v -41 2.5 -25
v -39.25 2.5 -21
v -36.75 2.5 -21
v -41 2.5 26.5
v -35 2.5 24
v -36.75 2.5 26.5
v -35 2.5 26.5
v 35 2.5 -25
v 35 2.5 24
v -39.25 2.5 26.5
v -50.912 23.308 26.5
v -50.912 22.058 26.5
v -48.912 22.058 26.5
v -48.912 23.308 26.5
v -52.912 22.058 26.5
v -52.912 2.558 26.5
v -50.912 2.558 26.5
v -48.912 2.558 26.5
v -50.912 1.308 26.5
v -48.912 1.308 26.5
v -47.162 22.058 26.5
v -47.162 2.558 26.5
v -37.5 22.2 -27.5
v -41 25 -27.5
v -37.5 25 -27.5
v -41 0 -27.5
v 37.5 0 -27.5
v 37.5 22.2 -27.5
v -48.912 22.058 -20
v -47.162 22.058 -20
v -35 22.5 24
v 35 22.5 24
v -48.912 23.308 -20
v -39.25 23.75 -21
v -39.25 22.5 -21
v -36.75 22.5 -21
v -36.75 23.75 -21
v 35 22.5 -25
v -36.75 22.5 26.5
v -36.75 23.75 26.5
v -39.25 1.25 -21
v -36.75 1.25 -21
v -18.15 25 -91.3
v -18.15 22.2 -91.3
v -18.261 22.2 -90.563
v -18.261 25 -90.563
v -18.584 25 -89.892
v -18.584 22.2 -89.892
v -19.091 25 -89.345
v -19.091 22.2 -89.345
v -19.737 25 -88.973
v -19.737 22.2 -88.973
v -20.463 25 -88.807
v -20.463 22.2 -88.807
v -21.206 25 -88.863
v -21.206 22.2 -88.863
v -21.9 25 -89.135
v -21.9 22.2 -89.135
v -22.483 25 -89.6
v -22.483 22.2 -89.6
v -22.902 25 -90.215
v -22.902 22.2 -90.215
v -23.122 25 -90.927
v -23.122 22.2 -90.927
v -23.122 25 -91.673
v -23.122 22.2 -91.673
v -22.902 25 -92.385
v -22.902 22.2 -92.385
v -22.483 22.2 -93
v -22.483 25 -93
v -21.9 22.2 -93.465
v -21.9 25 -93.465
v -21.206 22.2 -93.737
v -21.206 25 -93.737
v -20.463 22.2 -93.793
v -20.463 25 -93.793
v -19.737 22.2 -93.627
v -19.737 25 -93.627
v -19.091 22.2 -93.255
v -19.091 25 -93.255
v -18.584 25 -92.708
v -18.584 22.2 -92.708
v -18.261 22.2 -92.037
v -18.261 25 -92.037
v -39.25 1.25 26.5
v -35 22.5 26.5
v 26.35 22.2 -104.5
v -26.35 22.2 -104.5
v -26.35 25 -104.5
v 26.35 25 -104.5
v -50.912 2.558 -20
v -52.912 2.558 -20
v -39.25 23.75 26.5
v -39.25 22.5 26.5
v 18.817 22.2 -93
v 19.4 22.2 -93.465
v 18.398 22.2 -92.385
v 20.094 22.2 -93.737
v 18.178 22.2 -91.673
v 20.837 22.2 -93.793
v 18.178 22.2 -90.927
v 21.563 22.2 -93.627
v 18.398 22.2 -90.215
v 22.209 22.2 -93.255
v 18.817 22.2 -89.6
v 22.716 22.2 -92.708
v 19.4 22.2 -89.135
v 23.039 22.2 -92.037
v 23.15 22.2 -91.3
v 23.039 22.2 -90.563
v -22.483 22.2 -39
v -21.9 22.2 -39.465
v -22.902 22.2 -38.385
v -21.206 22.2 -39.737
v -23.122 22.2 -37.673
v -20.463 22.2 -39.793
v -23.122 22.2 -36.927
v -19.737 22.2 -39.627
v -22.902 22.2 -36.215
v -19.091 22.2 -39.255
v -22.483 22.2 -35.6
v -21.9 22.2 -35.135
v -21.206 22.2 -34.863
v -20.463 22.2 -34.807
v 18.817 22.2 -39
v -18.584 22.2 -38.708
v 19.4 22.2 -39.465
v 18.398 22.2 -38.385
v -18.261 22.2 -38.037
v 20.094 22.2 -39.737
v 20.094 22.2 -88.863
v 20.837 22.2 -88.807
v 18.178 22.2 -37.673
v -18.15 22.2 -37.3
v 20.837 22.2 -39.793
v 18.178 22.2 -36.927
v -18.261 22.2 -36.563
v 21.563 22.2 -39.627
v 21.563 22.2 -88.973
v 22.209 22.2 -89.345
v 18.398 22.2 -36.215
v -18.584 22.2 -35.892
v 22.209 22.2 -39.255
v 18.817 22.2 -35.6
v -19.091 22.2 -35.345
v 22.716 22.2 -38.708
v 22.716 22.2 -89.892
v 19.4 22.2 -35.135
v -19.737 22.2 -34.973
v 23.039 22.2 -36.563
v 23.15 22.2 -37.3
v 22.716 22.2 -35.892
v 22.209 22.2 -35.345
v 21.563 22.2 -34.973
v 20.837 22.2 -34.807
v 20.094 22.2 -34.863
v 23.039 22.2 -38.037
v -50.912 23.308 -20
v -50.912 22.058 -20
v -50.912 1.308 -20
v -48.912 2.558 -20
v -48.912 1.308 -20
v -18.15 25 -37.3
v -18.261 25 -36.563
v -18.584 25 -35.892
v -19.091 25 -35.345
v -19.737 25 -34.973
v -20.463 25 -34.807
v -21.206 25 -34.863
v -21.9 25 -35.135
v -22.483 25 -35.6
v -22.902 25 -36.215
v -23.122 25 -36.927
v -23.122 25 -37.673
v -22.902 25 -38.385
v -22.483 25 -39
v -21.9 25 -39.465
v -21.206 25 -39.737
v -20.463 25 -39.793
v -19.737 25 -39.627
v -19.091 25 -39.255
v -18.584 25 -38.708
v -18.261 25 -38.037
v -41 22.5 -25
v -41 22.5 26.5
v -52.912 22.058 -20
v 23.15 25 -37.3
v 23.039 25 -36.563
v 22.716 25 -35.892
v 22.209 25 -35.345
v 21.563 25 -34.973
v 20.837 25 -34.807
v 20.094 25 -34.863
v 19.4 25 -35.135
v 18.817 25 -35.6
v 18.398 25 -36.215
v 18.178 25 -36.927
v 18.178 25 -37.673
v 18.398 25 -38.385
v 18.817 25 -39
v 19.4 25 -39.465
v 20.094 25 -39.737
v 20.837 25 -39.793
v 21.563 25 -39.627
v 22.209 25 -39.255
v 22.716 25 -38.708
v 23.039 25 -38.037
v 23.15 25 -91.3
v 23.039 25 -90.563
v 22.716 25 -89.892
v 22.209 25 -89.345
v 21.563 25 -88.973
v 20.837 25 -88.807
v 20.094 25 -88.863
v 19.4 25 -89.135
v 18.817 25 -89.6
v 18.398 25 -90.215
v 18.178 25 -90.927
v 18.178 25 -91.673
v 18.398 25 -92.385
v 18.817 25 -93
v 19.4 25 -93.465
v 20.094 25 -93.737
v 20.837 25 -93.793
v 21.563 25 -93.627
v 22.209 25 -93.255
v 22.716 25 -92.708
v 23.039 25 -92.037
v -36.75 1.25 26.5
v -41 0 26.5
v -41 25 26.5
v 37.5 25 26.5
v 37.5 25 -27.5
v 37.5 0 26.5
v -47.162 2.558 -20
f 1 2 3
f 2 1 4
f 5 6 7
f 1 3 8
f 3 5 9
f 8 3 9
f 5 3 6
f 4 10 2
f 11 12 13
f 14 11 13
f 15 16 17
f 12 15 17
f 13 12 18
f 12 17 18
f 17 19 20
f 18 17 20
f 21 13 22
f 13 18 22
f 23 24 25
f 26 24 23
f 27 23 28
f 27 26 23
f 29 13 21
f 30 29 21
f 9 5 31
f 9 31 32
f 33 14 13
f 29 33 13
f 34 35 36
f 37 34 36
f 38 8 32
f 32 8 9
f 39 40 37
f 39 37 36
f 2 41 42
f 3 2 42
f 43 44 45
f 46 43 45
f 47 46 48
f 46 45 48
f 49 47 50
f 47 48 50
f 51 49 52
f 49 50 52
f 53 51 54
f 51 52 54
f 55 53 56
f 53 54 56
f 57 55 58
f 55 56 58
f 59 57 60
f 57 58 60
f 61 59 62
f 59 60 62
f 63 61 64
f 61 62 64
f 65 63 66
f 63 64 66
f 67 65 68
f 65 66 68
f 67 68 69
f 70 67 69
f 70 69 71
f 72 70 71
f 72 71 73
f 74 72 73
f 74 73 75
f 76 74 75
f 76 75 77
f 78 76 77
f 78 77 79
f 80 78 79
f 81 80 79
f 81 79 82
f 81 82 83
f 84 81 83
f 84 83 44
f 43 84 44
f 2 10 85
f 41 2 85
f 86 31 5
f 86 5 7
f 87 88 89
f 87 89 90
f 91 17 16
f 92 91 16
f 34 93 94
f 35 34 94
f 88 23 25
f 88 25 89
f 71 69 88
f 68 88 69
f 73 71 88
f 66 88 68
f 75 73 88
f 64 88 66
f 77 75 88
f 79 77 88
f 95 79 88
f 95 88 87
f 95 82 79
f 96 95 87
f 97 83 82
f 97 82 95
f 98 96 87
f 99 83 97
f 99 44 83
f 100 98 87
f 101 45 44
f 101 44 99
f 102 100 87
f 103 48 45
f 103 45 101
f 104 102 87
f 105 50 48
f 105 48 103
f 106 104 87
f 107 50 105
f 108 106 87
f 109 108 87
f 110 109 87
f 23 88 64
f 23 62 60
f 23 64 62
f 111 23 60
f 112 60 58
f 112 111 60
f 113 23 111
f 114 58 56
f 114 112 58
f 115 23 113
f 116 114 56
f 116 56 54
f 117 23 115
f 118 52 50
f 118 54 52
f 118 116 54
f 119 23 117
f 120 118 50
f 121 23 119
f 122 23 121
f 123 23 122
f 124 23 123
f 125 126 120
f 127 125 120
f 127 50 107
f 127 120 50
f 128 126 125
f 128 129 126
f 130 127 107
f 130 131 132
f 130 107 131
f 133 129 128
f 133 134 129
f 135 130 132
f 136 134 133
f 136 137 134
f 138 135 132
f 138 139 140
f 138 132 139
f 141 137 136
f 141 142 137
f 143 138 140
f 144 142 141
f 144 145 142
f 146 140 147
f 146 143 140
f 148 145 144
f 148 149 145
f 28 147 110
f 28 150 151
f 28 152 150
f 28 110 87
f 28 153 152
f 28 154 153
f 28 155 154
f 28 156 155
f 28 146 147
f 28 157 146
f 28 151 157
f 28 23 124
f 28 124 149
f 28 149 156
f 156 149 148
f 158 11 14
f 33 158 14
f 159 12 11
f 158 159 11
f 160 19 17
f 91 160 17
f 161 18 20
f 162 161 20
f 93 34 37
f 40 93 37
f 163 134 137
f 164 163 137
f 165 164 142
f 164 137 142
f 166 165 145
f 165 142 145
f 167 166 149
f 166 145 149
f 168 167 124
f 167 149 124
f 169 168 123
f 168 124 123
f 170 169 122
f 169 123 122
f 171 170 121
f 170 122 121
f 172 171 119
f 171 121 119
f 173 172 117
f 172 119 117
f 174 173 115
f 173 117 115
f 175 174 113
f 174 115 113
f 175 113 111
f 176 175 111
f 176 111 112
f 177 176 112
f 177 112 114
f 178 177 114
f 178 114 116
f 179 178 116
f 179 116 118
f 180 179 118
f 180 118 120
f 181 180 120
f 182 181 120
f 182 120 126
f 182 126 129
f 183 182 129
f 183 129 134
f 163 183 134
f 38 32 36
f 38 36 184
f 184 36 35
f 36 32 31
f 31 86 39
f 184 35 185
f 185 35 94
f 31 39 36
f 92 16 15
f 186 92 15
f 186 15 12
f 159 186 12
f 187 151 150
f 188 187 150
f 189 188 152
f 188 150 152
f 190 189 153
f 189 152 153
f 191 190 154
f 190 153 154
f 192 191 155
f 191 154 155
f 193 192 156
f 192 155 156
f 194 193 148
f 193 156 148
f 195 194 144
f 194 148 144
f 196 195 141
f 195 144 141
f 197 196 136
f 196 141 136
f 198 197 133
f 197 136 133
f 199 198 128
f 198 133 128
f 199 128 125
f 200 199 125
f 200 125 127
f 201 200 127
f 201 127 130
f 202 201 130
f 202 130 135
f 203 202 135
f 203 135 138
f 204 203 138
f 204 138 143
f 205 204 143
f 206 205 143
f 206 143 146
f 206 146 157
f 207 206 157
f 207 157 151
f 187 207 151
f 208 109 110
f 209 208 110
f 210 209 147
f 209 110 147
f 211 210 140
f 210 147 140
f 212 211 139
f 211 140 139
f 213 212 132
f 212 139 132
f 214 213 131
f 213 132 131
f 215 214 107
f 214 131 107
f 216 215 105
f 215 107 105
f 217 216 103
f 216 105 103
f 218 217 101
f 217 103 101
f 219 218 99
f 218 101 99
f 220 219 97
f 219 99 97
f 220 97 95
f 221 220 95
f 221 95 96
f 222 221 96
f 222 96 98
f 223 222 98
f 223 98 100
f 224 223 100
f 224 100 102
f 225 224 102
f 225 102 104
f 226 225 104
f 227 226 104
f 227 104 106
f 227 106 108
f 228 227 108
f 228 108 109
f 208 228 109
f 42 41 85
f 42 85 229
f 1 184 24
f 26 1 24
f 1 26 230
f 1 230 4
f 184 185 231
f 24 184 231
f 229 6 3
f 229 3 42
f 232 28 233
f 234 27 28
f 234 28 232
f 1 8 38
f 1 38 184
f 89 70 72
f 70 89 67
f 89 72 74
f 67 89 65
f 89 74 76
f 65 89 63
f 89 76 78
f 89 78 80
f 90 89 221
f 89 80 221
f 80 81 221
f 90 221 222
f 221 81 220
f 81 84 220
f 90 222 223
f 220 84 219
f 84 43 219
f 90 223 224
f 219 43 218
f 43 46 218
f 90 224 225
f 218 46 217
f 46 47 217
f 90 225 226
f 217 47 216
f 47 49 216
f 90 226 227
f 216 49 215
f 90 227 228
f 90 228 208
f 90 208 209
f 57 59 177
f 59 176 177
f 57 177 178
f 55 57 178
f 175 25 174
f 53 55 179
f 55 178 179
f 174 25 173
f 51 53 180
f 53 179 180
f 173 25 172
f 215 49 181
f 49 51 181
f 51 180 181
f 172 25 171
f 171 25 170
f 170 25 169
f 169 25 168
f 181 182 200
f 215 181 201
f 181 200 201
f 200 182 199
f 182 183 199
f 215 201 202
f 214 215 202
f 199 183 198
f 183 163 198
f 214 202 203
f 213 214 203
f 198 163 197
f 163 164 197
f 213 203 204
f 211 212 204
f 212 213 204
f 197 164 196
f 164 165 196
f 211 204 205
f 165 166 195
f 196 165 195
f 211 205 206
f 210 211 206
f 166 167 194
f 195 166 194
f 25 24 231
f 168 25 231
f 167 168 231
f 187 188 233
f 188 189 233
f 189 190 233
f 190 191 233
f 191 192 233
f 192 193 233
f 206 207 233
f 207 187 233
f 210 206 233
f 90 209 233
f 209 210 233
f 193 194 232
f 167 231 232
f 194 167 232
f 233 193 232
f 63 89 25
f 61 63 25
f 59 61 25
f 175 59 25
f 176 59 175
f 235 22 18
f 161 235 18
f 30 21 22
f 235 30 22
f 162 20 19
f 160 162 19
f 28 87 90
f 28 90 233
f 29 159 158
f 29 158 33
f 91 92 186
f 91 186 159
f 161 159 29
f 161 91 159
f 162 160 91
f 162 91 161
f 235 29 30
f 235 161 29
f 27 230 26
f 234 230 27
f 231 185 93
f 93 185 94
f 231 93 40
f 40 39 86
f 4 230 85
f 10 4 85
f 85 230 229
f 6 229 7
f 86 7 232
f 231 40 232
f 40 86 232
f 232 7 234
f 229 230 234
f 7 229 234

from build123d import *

# Parameters (mm, degrees)
F0_W      = 70
F0_H      = 49
F0_W_2    = 26.35
F0_H_2    = 0.8
F0_R      = 2.5
F0_W_3    = 3.5
F0_H_3    = 2.5
F0_W_4    = 2.5
F1_DEPTH  = 25
F2_DEPTH  = 22.5
F3_DEPTH  = 2.5
F6_W      = 2.5
F6_H      = 1.25
F7_DEPTH  = 51.5
F8_DEPTH  = 47.5
F9_DEPTH  = 46.5
F10_DEPTH = 22.2


# Not quite as in the source:
# - a feature names something its author has since deleted; it is built from what else it names


with BuildPart() as f1:
    # F0 (on Front) → F1 (new body)
    with BuildSketch(Plane.XZ):
        Polygon((-35, 24), (35, 24), (35, -25), (-35, -25), (-35, -27.5), (-26.35, -27.5), (0, -27.5), (26.35, -27.5), (37.5, -27.5), (37.5, 26.5), (-35, 26.5), align=None)
        with Locations((0, -0.5)):
            Rectangle(F0_W, F0_H)
        Polygon((26.35, -104.5), (37.5, -27.5), (26.35, -27.5), (26.35, -28.3), align=None)
        with Locations((-13.175, -27.9)):
            Rectangle(F0_W_2, F0_H_2)
        with Locations((13.175, -27.9)):
            Rectangle(F0_W_2, F0_H_2)
        Polygon((0, -28.3), (-26.35, -28.3), (-26.35, -104.5), (26.35, -104.5), (26.35, -28.3), align=None)
        with Locations((-20.65, -91.3)):
            Circle(F0_R, mode=Mode.SUBTRACT)
        with Locations((20.65, -91.3)):
            Circle(F0_R, mode=Mode.SUBTRACT)
        with Locations((-20.65, -37.3)):
            Circle(F0_R, mode=Mode.SUBTRACT)
        with Locations((20.65, -37.3)):
            Circle(F0_R, mode=Mode.SUBTRACT)
        Polygon((-26.35, -27.5), (-35, -27.5), (-37.5, -27.5), (-26.35, -104.5), (-26.35, -28.3), align=None)
        with Locations((-39.25, -26.25)):
            Rectangle(F0_W_3, F0_H_3)
        with Locations((-36.25, -26.25)):
            Rectangle(F0_W_4, F0_H_3)
    extrude(amount=-F1_DEPTH)

    # F0 (on Front) → F2 (cut)
    with BuildSketch(Plane.XZ):
        with Locations((0, -0.5)):
            Rectangle(F0_W, F0_H)
    extrude(amount=-F2_DEPTH, mode=Mode.SUBTRACT)

    # F0 (on Front) → F3 (join)
    with BuildSketch(Plane.XZ):
        with Locations((0, -0.5)):
            Rectangle(F0_W, F0_H)
    extrude(amount=-F3_DEPTH)

    # F6 (on 3pt) → F7 (join)
    with BuildSketch(Plane(origin=(0, 0, 26.5), x_dir=(1, 0, 0), z_dir=(0, 0, -1))):
        Polygon((-35, -25), (-35, -22.5), (-36.75, -22.5), (-36.75, -23.75), (-39.25, -23.75), (-39.25, -22.5), (-41, -22.5), (-41, -25), align=None)
        Polygon((-35, -2.5), (-35, 0), (-41, 0), (-41, -2.5), (-39.25, -2.5), (-39.25, -1.25), (-36.75, -1.25), (-36.75, -2.5), align=None)
        with Locations((-38, -1.875)):
            Rectangle(F6_W, F6_H)
        with Locations((-38, -23.125)):
            Rectangle(F6_W, F6_H)
    extrude(amount=F7_DEPTH)

    # F6 (on 3pt) → F8 (cut)
    with BuildSketch(Plane(origin=(0, 0, 26.5), x_dir=(1, 0, 0), z_dir=(0, 0, -1))):
        with Locations((-38, -23.125)):
            Rectangle(F6_W, F6_H)
        with Locations((-38, -1.875)):
            Rectangle(F6_W, F6_H)
    extrude(amount=F8_DEPTH, mode=Mode.SUBTRACT)

    # F0 (on Front) → F10 (cut)
    with BuildSketch(Plane.XZ):
        Polygon((-26.35, -27.5), (-35, -27.5), (-37.5, -27.5), (-26.35, -104.5), (-26.35, -28.3), align=None)
        Polygon((0, -28.3), (-26.35, -28.3), (-26.35, -104.5), (26.35, -104.5), (26.35, -28.3), align=None)
        with Locations((-20.65, -91.3)):
            Circle(F0_R, mode=Mode.SUBTRACT)
        with Locations((20.65, -91.3)):
            Circle(F0_R, mode=Mode.SUBTRACT)
        with Locations((-20.65, -37.3)):
            Circle(F0_R, mode=Mode.SUBTRACT)
        with Locations((20.65, -37.3)):
            Circle(F0_R, mode=Mode.SUBTRACT)
        Polygon((26.35, -104.5), (37.5, -27.5), (26.35, -27.5), (26.35, -28.3), align=None)
        with Locations((-13.175, -27.9)):
            Rectangle(F0_W_2, F0_H_2)
        with Locations((13.175, -27.9)):
            Rectangle(F0_W_2, F0_H_2)
    extrude(amount=-F10_DEPTH, mode=Mode.SUBTRACT)


with BuildPart() as f9:
    # F6 (on 3pt) → F9 (new body)
    with BuildSketch(Plane(origin=(0, 0, 26.5), x_dir=(1, 0, 0), z_dir=(0, 0, -1))):
        Polygon((-52.9117025435, -2.5576207936), (-52.9117025435, -22.0576207936), (-50.9117025435, -22.0576207936), (-50.9117025435, -23.3076207936), (-48.9117025435, -23.3076207936), (-48.9117025435, -22.0576207936), (-47.1617025435, -22.0576207936), (-47.1617025435, -2.5576207936), (-48.9117025435, -2.5576207936), (-48.9117025435, -1.3076207936), (-50.9117025435, -1.3076207936), (-50.9117025435, -2.5576207936), align=None)
    extrude(amount=F9_DEPTH)


solid = Compound([f1.part, f9.part])
